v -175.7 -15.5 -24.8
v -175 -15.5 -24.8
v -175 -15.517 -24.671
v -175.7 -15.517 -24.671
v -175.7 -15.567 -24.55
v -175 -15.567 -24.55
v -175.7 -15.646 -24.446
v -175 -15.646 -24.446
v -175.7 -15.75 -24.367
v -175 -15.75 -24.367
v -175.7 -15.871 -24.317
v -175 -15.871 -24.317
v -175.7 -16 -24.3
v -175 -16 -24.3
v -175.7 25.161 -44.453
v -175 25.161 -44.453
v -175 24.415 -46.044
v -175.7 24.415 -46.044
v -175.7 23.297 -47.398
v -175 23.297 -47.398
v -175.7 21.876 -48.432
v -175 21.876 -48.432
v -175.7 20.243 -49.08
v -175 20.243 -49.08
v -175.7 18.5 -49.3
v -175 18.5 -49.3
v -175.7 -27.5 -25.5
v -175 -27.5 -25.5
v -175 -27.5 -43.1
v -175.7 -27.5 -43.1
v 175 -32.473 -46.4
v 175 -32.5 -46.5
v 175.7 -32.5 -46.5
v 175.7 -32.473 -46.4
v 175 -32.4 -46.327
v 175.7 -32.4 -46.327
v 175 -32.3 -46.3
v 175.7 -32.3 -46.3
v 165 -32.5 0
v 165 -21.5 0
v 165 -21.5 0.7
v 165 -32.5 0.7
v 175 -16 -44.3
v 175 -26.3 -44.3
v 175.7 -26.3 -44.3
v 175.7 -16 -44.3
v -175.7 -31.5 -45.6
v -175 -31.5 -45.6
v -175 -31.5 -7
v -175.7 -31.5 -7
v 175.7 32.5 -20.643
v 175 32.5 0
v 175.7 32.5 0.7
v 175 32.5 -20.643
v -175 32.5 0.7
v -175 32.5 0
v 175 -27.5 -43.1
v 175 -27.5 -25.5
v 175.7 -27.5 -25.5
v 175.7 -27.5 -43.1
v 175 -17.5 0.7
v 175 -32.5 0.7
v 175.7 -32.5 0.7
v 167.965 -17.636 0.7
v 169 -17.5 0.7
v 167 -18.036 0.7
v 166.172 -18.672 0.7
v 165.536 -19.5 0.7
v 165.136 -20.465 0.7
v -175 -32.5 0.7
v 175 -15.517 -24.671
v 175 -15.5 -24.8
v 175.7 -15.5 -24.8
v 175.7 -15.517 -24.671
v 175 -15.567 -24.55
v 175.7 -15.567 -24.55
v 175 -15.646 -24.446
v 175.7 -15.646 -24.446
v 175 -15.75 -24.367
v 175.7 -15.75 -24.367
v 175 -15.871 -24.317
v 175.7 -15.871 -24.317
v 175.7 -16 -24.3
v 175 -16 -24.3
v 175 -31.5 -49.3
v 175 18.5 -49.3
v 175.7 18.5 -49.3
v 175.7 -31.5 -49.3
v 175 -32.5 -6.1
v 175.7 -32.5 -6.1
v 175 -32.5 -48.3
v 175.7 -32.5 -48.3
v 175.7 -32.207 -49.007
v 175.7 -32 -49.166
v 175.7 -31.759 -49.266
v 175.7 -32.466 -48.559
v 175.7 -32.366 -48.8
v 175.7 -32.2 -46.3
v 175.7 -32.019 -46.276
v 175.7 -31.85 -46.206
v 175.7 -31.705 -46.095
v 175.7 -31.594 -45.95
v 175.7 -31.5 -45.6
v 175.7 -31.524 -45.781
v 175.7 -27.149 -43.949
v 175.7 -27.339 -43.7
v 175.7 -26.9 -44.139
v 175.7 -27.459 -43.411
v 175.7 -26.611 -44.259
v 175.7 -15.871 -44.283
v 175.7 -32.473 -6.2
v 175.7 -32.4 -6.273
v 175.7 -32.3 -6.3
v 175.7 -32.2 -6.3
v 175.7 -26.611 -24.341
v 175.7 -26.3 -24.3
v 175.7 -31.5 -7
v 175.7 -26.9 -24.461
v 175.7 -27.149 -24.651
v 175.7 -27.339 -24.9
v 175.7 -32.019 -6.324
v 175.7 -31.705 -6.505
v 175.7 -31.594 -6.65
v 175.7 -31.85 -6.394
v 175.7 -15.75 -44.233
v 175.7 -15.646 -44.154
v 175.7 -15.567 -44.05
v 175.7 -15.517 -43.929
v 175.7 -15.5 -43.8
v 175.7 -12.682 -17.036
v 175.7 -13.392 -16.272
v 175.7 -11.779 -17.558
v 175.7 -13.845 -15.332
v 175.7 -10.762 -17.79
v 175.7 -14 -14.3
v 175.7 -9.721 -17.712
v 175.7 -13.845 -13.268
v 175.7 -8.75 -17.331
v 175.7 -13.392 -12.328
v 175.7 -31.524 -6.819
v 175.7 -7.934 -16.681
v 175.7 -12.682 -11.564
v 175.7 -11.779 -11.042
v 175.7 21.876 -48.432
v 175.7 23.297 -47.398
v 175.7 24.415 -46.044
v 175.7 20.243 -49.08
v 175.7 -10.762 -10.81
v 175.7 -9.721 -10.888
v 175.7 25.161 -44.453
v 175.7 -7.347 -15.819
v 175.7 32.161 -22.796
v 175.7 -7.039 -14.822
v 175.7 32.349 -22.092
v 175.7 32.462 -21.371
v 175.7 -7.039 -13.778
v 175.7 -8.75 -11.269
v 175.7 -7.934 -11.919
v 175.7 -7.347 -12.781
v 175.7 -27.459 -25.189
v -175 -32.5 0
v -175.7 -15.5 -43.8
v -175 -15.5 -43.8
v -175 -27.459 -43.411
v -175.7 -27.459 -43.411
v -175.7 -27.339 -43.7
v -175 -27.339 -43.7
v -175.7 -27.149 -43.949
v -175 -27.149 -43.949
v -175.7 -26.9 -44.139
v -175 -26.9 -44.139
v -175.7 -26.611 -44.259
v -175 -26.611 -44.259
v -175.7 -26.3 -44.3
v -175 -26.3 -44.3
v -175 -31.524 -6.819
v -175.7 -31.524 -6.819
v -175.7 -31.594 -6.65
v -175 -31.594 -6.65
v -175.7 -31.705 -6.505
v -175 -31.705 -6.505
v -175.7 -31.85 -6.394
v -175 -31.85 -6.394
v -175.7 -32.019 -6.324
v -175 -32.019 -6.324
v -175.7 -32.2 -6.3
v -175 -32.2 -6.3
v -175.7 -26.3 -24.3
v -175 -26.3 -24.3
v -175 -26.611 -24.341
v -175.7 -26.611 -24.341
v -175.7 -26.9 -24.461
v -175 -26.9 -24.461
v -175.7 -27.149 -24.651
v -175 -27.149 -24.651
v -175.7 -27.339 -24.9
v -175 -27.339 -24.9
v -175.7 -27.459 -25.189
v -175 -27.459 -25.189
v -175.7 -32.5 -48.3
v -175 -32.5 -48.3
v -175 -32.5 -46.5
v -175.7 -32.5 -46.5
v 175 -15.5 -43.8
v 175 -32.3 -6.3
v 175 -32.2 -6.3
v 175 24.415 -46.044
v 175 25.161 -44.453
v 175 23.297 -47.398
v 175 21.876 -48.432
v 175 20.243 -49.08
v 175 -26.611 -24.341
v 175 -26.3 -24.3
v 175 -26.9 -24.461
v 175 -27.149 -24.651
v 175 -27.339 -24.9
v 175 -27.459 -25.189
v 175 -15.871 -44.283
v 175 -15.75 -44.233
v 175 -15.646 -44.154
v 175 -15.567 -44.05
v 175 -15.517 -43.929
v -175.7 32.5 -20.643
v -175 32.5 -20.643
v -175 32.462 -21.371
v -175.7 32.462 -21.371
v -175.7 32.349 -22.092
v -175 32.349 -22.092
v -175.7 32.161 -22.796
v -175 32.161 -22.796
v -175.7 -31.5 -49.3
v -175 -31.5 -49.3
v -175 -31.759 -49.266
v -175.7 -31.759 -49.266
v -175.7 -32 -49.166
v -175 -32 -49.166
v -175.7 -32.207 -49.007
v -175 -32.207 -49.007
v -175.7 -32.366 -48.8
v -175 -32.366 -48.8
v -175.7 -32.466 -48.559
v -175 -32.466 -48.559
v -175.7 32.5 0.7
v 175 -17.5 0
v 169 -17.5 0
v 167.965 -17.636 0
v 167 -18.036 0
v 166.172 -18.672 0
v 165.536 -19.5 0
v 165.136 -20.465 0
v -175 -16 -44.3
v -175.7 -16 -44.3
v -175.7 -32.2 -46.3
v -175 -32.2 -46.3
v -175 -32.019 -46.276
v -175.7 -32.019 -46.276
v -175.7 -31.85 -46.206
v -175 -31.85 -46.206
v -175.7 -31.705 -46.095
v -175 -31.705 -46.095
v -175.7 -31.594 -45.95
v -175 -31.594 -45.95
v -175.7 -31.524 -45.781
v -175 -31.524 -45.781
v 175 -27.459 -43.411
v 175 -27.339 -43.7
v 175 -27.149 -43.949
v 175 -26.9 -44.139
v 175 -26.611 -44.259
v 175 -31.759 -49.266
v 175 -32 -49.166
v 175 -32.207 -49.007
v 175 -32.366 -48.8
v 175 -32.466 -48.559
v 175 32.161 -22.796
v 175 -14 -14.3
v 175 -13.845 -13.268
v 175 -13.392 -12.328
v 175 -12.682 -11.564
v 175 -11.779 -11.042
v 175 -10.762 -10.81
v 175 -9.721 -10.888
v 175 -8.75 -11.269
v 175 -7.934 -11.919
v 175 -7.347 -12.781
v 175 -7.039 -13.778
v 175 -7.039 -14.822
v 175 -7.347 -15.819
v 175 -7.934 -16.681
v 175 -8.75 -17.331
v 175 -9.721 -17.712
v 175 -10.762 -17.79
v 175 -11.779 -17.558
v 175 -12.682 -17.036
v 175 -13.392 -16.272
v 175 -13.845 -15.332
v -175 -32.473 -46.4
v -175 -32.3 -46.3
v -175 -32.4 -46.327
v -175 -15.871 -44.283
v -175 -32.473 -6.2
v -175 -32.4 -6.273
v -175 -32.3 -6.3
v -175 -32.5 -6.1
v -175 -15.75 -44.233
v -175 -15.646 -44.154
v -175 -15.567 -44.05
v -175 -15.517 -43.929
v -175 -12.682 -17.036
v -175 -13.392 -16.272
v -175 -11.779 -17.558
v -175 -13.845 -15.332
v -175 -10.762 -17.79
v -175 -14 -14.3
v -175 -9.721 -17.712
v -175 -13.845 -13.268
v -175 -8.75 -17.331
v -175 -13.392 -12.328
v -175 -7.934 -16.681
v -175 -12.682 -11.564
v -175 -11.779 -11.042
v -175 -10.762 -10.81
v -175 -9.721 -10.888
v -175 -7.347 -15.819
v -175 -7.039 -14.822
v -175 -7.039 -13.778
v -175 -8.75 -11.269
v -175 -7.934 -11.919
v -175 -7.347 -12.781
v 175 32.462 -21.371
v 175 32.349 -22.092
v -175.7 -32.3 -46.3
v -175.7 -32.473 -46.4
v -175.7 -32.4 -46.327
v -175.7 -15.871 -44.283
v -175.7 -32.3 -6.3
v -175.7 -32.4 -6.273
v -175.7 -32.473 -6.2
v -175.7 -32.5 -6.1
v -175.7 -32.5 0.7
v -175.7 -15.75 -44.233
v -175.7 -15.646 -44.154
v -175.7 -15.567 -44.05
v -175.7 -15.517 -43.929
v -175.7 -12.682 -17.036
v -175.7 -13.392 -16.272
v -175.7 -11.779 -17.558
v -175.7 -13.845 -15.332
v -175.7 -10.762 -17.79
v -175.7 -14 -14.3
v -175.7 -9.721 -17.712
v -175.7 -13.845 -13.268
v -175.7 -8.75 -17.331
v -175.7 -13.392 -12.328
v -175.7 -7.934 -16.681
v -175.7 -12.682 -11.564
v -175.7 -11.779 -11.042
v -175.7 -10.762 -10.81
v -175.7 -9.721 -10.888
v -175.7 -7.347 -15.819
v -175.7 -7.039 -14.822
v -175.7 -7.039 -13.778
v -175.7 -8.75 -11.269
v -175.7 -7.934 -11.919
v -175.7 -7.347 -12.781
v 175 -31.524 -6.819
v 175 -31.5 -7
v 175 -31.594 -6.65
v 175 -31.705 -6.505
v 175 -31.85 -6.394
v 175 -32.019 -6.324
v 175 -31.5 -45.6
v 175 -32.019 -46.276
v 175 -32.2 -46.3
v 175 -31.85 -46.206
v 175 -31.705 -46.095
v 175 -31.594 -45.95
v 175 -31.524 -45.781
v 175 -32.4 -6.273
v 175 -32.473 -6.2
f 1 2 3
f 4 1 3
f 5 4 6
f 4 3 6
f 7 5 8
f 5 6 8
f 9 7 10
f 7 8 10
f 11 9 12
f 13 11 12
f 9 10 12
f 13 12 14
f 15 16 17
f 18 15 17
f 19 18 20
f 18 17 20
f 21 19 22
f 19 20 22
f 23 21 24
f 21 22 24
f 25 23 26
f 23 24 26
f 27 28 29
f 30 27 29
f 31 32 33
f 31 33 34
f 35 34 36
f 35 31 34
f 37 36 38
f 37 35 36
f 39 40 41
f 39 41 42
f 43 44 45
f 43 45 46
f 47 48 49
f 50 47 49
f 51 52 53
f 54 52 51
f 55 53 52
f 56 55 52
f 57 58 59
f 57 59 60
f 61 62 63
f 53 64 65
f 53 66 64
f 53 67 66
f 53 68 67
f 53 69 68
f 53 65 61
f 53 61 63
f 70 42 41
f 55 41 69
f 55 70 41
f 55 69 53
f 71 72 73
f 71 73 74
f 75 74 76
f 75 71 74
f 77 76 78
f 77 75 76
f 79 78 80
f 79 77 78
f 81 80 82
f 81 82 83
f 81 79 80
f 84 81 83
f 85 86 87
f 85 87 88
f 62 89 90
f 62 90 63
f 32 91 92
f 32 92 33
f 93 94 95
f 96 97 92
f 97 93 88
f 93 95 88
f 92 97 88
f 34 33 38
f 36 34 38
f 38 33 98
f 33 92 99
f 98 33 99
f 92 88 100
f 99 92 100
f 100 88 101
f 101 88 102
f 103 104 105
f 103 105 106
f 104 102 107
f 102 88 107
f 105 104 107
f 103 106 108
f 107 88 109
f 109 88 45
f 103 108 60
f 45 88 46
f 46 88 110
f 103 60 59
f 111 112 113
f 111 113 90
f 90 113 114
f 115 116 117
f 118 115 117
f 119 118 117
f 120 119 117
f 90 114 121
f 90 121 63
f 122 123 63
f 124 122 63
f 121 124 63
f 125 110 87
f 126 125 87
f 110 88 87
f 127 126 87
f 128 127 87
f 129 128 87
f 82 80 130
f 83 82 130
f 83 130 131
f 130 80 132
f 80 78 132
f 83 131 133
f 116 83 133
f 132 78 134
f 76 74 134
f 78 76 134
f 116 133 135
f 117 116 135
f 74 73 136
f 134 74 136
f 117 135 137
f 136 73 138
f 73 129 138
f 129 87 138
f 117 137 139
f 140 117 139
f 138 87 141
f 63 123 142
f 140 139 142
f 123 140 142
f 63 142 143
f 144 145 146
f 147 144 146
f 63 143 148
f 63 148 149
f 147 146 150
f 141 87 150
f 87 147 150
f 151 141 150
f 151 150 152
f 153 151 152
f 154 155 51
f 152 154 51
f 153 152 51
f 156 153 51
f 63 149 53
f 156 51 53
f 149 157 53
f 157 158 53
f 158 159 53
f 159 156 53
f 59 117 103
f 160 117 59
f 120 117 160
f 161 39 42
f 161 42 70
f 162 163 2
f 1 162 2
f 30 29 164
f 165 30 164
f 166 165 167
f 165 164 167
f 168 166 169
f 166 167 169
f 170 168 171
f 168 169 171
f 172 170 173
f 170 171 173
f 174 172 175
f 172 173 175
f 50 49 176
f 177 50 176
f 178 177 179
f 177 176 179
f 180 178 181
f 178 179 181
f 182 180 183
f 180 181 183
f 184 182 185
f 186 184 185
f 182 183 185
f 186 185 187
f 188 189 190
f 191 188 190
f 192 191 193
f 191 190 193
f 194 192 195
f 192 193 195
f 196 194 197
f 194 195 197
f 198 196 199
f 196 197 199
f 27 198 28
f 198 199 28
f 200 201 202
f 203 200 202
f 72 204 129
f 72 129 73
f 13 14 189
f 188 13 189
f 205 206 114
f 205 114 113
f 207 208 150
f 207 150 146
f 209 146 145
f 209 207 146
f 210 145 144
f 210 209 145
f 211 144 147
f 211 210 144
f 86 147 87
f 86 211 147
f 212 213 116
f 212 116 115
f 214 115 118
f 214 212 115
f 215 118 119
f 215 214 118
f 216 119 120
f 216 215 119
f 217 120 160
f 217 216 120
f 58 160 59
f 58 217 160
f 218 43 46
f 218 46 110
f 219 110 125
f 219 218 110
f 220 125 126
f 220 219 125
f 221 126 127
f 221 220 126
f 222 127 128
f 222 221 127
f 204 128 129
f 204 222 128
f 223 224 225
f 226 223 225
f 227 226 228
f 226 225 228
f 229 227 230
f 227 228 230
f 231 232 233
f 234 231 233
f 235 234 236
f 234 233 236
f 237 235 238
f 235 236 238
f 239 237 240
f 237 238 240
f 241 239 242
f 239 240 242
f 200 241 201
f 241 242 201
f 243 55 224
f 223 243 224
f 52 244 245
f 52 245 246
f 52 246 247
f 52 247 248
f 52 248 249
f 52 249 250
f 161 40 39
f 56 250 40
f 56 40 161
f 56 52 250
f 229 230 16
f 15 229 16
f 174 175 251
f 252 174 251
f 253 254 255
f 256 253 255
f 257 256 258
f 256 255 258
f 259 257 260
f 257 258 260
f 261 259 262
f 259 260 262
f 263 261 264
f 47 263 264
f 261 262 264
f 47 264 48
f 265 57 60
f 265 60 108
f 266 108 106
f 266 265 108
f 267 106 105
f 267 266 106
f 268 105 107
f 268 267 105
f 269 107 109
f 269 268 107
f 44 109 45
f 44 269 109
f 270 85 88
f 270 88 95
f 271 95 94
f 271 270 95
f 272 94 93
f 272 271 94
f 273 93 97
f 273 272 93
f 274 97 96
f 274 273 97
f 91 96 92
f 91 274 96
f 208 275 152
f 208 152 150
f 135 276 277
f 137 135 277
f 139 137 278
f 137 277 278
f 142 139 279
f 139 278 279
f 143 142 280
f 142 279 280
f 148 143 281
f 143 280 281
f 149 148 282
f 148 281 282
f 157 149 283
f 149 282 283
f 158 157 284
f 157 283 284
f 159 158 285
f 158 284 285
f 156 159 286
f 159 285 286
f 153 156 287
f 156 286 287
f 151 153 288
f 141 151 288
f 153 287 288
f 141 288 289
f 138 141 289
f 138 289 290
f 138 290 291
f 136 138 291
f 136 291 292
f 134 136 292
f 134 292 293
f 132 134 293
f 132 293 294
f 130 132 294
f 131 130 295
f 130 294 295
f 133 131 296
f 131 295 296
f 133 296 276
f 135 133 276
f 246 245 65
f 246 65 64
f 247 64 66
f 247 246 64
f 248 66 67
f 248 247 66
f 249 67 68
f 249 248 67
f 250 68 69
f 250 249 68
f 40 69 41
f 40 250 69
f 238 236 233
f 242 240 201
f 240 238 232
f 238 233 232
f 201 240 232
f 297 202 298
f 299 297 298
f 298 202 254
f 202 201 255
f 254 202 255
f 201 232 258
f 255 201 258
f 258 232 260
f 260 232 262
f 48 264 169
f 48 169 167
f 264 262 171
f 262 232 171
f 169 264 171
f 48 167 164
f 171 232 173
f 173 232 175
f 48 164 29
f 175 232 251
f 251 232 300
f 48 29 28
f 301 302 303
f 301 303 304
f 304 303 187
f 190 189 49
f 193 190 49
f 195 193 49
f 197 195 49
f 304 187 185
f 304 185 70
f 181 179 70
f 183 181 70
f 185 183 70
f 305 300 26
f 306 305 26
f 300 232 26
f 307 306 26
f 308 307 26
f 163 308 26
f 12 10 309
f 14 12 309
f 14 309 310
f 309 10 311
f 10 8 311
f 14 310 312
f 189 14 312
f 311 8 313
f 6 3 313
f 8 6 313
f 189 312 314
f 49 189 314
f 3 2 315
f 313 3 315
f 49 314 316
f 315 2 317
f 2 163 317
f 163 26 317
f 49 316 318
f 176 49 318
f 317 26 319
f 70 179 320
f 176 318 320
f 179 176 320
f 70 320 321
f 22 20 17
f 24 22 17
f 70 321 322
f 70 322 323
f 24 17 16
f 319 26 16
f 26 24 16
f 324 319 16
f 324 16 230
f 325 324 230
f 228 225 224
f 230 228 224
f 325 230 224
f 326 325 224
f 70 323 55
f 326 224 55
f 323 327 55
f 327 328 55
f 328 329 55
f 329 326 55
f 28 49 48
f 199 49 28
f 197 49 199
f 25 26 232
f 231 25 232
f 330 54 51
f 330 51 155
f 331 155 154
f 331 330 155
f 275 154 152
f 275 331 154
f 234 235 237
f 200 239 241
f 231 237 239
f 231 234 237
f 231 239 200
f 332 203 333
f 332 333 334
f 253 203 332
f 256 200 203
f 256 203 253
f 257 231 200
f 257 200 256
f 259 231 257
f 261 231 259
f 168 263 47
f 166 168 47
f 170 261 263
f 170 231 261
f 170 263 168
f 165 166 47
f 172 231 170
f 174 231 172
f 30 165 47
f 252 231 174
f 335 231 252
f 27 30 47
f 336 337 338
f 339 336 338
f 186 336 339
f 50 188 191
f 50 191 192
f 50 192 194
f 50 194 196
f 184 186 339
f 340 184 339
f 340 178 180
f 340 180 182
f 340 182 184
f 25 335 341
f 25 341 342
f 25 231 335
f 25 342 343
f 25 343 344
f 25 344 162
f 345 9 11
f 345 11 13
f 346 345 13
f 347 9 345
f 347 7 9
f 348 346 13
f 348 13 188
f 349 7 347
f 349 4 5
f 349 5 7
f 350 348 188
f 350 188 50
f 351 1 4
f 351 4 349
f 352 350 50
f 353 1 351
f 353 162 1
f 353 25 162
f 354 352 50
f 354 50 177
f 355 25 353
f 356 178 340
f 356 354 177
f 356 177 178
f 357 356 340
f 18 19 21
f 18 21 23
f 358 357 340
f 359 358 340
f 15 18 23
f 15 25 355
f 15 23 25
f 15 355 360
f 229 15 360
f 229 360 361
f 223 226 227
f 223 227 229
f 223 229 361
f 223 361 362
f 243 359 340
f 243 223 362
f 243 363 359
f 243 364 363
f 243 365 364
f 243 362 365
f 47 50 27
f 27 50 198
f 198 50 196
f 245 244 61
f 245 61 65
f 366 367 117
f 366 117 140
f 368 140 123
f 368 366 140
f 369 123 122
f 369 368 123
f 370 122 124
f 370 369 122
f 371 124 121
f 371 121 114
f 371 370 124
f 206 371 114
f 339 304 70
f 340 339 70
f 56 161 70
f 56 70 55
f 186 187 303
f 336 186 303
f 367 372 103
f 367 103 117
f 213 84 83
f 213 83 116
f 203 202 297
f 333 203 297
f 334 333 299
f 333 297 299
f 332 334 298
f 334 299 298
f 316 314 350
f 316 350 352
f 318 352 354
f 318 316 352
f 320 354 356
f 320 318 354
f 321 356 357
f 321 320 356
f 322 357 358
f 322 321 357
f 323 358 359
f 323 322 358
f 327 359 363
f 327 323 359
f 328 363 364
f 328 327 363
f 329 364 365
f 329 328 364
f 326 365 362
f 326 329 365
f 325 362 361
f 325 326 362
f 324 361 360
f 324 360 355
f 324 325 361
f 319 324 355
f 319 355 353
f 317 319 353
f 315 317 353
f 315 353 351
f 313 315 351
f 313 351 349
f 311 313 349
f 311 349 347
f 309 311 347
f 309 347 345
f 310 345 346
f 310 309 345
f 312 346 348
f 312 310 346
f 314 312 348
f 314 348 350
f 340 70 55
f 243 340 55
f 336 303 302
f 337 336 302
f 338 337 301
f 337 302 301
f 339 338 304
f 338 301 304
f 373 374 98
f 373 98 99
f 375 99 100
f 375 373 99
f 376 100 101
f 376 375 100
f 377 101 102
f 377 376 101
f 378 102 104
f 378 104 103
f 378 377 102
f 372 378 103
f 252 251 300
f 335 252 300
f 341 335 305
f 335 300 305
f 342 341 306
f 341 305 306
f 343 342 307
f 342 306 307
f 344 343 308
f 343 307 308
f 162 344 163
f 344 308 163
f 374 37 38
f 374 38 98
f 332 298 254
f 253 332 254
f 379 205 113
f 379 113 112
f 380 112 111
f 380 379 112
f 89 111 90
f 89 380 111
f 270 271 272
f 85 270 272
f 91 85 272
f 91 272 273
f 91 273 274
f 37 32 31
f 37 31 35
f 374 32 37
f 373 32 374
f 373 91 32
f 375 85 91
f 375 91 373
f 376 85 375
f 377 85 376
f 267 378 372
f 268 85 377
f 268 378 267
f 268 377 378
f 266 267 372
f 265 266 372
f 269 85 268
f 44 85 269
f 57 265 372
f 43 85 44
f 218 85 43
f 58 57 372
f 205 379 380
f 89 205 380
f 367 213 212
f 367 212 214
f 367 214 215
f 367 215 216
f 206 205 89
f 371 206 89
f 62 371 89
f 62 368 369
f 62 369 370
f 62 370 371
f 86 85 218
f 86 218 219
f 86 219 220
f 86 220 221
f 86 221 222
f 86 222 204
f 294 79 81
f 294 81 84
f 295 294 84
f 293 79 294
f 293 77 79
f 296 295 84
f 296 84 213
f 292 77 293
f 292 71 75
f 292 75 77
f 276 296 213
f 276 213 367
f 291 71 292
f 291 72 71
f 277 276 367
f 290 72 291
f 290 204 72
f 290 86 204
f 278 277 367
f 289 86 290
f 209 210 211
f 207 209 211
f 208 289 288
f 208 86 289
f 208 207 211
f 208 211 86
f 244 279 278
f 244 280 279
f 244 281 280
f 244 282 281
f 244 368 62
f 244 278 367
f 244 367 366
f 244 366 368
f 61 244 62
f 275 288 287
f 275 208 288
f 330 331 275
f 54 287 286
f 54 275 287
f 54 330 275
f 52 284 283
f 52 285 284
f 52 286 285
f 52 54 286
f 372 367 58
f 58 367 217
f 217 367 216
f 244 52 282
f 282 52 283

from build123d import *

# Parameters (mm, degrees)
BACK_WALL_DEPTH  = 0.7
SKETCH2_R        = 3.5
RIGHT_WALL_DEPTH = 0.7


with BuildPart() as part:
    # Sketch1 → Back Wall (new body)
    with BuildSketch(Plane.XY):
        with BuildLine():
            Line((175, -17.5), (169, -17.5))
            ThreePointArc((169, -17.5), (166.171572875, -18.671572875), (165, -21.5))
            Line((165, -21.5), (165, -32.5))
            Line((165, -32.5), (-175, -32.5))
            Line((-175, -32.5), (-175, 32.5))
            Line((-175, 32.5), (175, 32.5))
            Line((175, 32.5), (175, -17.5))
        make_face()
    extrude(amount=BACK_WALL_DEPTH)


with BuildPart() as body_2:
    # Sketch2 → Right Wall (new body)
    with BuildSketch(Plane.ZY.offset(175)):
        with BuildLine():
            Line((-48.3, -32.5), (-46.5, -32.5))
            ThreePointArc((-46.5, -32.5), (-46.358578644, -32.441421356), (-46.3, -32.3))
            Line((-46.3, -32.3), (-46.3, -32.2))
            ThreePointArc((-46.3, -32.2), (-46.094974747, -31.705025253), (-45.6, -31.5))
            Line((-45.6, -31.5), (-7, -31.5))
            ThreePointArc((-7, -31.5), (-6.505025253, -31.705025253), (-6.3, -32.2))
            Line((-6.3, -32.2), (-6.3, -32.3))
            ThreePointArc((-6.3, -32.3), (-6.241421356, -32.441421356), (-6.1, -32.5))
            Line((-6.1, -32.5), (0.7, -32.5))
            Line((0.7, -32.5), (0.7, 32.5))
            Line((0.7, 32.5), (-20.643340495, 32.5))
            ThreePointArc((-20.643340495, 32.5), (-21.733083601, 32.414655448), (-22.79625424, 32.160702846))
            Line((-22.79625424, 32.160702846), (-44.452913745, 25.160702846))
            ThreePointArc((-44.452913745, 25.160702846), (-47.959964497, 22.618835016), (-49.3, 18.5))
            Line((-49.3, 18.5), (-49.3, -31.5))
            ThreePointArc((-49.3, -31.5), (-49.007106781, -32.207106781), (-48.3, -32.5))
        make_face()
        with Locations(Location((-14.3, -10.5, 0), (0, 0, 270))):
            Circle(SKETCH2_R, mode=Mode.SUBTRACT)
        with BuildLine():
            Line((-43.8, -15.5), (-24.8, -15.5))
            ThreePointArc((-24.8, -15.5), (-24.446446609, -15.646446609), (-24.3, -16))
            Line((-24.3, -16), (-24.3, -26.3))
            ThreePointArc((-24.3, -26.3), (-24.651471863, -27.148528137), (-25.5, -27.5))
            Line((-25.5, -27.5), (-43.1, -27.5))
            ThreePointArc((-43.1, -27.5), (-43.948528137, -27.148528137), (-44.3, -26.3))
            Line((-44.3, -26.3), (-44.3, -16))
            ThreePointArc((-44.3, -16), (-44.153553391, -15.646446609), (-43.8, -15.5))
        make_face(mode=Mode.SUBTRACT)
    right_wall = extrude(amount=RIGHT_WALL_DEPTH)


with BuildPart() as part_1:
    add(part.part)

    # Mirror8: Right Wall across plane
    add(right_wall.mirror(Plane(origin=(0, 0, 0), x_dir=(0, 0, 1), z_dir=(1, 0, 0))))


solid = Compound([body_2.part, part_1.part])
